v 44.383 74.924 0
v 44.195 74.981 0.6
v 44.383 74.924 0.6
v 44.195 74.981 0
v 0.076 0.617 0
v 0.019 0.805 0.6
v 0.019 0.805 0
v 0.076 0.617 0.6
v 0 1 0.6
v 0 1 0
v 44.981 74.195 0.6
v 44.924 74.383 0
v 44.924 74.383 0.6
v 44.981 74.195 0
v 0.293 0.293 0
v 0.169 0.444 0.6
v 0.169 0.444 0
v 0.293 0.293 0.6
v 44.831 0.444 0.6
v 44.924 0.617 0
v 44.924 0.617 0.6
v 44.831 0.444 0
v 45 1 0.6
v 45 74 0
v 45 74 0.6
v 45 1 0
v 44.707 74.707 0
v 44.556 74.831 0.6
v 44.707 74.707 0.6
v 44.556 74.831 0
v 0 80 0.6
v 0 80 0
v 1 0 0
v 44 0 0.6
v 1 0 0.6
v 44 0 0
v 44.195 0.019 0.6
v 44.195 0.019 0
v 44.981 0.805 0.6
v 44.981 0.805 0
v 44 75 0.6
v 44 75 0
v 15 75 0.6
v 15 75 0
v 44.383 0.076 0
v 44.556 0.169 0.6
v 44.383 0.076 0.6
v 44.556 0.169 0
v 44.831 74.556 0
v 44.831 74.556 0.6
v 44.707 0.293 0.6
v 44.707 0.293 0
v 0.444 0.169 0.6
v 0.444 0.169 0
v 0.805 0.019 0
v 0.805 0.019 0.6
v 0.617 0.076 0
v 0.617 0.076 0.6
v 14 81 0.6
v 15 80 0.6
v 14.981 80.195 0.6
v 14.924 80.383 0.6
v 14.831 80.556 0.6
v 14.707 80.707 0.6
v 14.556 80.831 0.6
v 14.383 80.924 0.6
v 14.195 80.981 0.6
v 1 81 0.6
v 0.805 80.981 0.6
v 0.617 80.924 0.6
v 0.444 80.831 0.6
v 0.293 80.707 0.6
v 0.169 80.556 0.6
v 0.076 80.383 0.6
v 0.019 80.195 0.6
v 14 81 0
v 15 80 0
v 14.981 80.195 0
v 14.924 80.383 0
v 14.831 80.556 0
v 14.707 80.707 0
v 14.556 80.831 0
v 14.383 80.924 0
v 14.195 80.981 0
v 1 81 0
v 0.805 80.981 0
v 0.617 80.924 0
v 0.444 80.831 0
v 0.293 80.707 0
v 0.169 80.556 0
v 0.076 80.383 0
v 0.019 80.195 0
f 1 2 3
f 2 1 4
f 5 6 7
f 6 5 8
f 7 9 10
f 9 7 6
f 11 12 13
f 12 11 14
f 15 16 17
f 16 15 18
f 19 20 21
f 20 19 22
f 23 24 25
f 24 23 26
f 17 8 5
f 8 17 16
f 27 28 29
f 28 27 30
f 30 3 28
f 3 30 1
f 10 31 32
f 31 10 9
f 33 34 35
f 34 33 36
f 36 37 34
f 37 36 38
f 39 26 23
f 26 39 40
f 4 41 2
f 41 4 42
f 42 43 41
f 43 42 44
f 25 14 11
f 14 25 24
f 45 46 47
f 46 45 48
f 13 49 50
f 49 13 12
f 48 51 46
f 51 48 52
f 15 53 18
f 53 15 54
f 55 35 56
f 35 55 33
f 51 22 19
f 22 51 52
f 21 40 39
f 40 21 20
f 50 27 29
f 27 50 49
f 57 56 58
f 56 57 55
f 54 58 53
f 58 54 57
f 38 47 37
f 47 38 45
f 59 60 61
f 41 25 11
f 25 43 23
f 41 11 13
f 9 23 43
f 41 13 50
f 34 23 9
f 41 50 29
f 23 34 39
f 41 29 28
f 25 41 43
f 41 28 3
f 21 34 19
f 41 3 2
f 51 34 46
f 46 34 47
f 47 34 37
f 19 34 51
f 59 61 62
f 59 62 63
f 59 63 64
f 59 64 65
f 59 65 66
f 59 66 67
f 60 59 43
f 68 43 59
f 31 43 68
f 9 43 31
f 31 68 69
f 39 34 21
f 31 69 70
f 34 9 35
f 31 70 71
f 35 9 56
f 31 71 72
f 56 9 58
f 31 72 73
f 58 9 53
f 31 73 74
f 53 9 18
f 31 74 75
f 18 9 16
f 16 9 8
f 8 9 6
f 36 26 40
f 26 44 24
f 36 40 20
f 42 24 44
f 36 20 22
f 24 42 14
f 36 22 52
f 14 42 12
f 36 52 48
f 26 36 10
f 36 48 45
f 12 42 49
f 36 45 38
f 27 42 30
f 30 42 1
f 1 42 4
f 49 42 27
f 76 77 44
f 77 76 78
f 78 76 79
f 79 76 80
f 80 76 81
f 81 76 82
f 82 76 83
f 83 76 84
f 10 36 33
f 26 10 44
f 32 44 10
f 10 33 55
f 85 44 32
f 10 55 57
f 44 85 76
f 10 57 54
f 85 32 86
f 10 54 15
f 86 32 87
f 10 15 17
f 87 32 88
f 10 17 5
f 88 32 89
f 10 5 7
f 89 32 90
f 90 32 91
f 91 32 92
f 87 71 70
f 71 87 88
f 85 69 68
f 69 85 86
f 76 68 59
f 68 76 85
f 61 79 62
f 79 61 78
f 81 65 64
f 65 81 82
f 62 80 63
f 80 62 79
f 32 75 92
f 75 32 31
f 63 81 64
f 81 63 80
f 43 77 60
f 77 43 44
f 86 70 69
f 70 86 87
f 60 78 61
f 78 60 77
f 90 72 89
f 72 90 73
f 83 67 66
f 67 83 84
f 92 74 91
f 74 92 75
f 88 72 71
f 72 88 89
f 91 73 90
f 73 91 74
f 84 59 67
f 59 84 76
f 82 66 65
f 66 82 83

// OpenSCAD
// Divider cards
// (c) Rainer Schlosshan

DivWidth=45;
DivHeight=75;
DivT=0.6;
CornerRadius=1;

TabHeight=6;
TabWidth=15;
TabPos=0;// [0:Left,1:Half Left,2:Middle,3:Half Right,4:Right]

// Rotate the text by this angle 
TextRotation=0; // positive values=clockwise, negative values=counter clockwise


/* [Text Line 1] */
// Put your text here
text="";
//Font to be used ( see https://fonts.google.com to choose from all of them )
font="exo"; //[<none>,abeezee,abel,abhayalibre,abrilfatface,abyssinicasil,acme,actor,adamina,adobeblank,adventpro,aguafinascript,akronim,aksarabaligalang,aladin,aldrich,alef,alefhebrew,alegreya,alegreyasans,alegreyasanssc,alegreyasc,aleo,alexbrush,alfaslabone,alice,alike,alikeangular,allan,allerta,allertastencil,allura,almendra,almendradisplay,almendrasc,amarante,amaranth,amaticasc,amaticsc,amethysta,amiko,amiri,amita,amstelvaralpha,anaheim,andada,andadasc,andika,angkor,annieuseyourtelescope,anonymouspro,antic,anticdidone,anticslab,anton,antonio,arapey,arbutus,arbutusslab,architectsdaughter,archivo,archivoblack,archivonarrow,archivovfbeta,arefruqaa,arimamadurai,arizonia,armata,arsenal,artifika,arvo,arya,asap,asapcondensed,asapvfbeta,asar,asset,assistant,astloch,asul,athiti,atma,atomicage,aubrey,audiowide,autourone,average,averagesans,averiagruesalibre,averialibre,averiasanslibre,averiaseriflibre,b612,b612mono,badscript,bahiana,baijamjuree,baloo,baloobhai,baloobhaijaan,baloobhaina,baloochettan,balooda,baloopaaji,balootamma,balootammudu,baloothambi,balthazar,bangers,barlow,barlowcondensed,barlowsemicondensed,barrio,basic,battambang,baumans,bayon,belgrano,bellefair,belleza,benchnine,bentham,berkshireswash,bevan,bhavuka,bigelowrules,bigshotone,bilbo,bilboswashcaps,biorhyme,biorhymeexpanded,biryani,bitter,blackandwhitepicture,blackhansans,blackopsone,bokor,bonbon,boogaloo,bowlbyone,bowlbyonesc,brawler,breeserif,brunoace,brunoacesc,bubblegumsans,bubblerone,buda,buenard,bungee,bungeehairline,bungeeinline,bungeeoutline,bungeeshade,butcherman,butchermancaps,butterflykids,cabin,cabincondensed,cabinsketch,cabinvfbeta,caesardressing,cagliostro,cairo,cambay,cambo,candal,cantarell,cantataone,cantoraone,capriola,cardo,carme,carroisgothic,carroisgothicsc,carterone,catamaran,caudex,caveat,caveatbrush,cedarvillecursive,cevicheone,chakrapetch,changa,changaone,chango,charm,charmonman,chathura,chauphilomeneone,chelaone,chelseamarket,chenla,cherryswash,chicle,chivo,chonburi,cinzel,cinzeldecorative,clickerscript,coda,codacaption,codystar,coiny,combo,comfortaa,concertone,condiment,conf.d,content,contrailone,convergence,cookie,copse,corben,cormorant,cormorantgaramond,cormorantinfant,cormorantsc,cormorantunicase,cormorantupright,courgette,coustard,coveredbyyourgrace,creepster,creteround,crimsontext,croissantone,cuprum,cutefont,cutive,cutivemono,damion,dancingscript,dangrek,dawningofanewday,daysone,decovaralpha,dekko,delius,deliusswashcaps,deliusunicase,dellarespira,denkone,devonshire,dhurjati,dhyana,didactgothic,digitalnumbers,diplomata,diplomatasc,dohyeon,dokdo,domine,donegalone,doppioone,dorsa,dosis,drsugiyama,durusans,dynalight,eaglelake,eastseadokdo,eater,eatercaps,ebgaramond,economica,eczar,ekmukta,electrolize,elmessiri,elsie,elsieswashcaps,emblemaone,emilyscandy,encodesans,encodesanscondensed,encodesansexpanded,encodesanssemicondensed,encodesanssemiexpanded,engagement,englebert,enriqueta,ericaone,esteban,euphoriascript,ewert,exo,exo2,expletussans,fahkwang,fanwoodtext,farsan,fascinate,fascinateinline,fasterone,fasthand,faunaone,faustina,faustinavfbeta,federant,federo,felipa,fenix,fingerpaint,firamono,firasans,firasanscondensed,firasansextracondensed,fjallaone,fjordone,flamenco,flavors,fondamento,fonts.conf,forum,francoisone,frankruhllibre,freckleface,frederickathegreat,fredokaone,freehand,fresca,frijole,fruktur,fugazone,gabriela,gaegu,gafata,galada,galdeano,galindo,gamjaflower,gemunulibre,gentiumbasic,gentiumbookbasic,geo,geostar,geostarfill,germaniaone,gfsdidot,gfsneohellenic,gidugu,gildadisplay,giveyouglory,glassantiqua,glegoo,gloriahallelujah,goblinone,gochihand,gorditas,gothica1,goudybookletter1911,graduate,grandhotel,gravitasone,greatvibes,griffy,gruppo,gudea,gugi,gurajada,habibi,halant,hammersmithone,hanalei,hanaleifill,handlee,hanna,hannari,hanuman,happymonkey,harmattan,headlandone,heebo,hennypenny,hermeneusone,herrvonmuellerhoff,himelody,hind,hindcolombo,hindguntur,hindjalandhar,hindkochi,hindmadurai,hindmysuru,hindsiliguri,hindvadodara,holtwoodonesc,homenaje,ibmplexmono,ibmplexsans,ibmplexsanscondensed,ibmplexserif,iceberg,iceland,imfelldoublepica,imfelldoublepicasc,imfelldwpica,imfelldwpicasc,imfellenglish,imfellenglishsc,imfellfrenchcanon,imfellfrenchcanonsc,imfellgreatprimer,imfellgreatprimersc,imprima,inconsolata,inder,indieflower,inika,inknutantiqua,istokweb,italiana,italianno,itim,jacquesfrancois,jacquesfrancoisshadow,jaldi,jejugothic,jejuhallasan,jejumyeongjo,jimnightshade,jockeyone,jollylodger,jomhuria,jomolhari,josefinsans,josefinsansstdlight,josefinslab,jotione,jua,judson,julee,juliussansone,junge,jura,justmeagaindownhere,k2d,kadwa,kalam,kameron,kanit,kantumruy,karla,karlatamilinclined,karlatamilupright,karma,katibeh,kaushanscript,kavivanar,kavoon,kdamthmor,keaniaone,kellyslab,kenia,khand,khmer,khula,khyay,kiranghaerang,kiteone,knewave,kodchasan,koho,kokoro,kopubbatang,kottaone,koulen,kreon,kristi,kronaone,krub,kumarone,kurale,labelleaurore,laila,lakkireddy,lalezar,lancelot,laomuangdon,laomuangkhong,laosanspro,lateef,lato,leaguescript,leckerlione,ledger,lekton,lemon,lemonada,lemonadavfbeta,Liberation-2.00.1,librebarcode128,librebarcode128text,librebarcode39,librebarcode39extended,librebarcode39extendedtext,librebarcode39text,librebaskerville,librecaslontext,librefranklin,lifesavers,lilitaone,lilyscriptone,limelight,lindenhill,lobster,lobstertwo,lohitbengali,lohitdevanagari,lohittamil,londrinaoutline,londrinashadow,londrinasketch,londrinasolid,lora,lovedbytheking,loversquarrel,loveyalikeasister,lusitana,lustria,macondo,macondoswashcaps,mada,magra,maitree,majormonodisplay,mako,mali,mallanna,mandali,manuale,marcellus,marcellussc,marckscript,margarine,markazitext,markazitextvfbeta,markoone,marmelad,martel,martelsans,marvel,mate,matesc,mavenpro,mavenprovfbeta,mclaren,meddon,medievalsharp,medulaone,meerainimai,megrim,meiescript,mergeone,merienda,meriendaone,merriweather,merriweathersans,mervalescript,metal,metalmania,metamorphous,metrophobic,miama,michroma,milonga,miltonian,miltoniantattoo,mina,miniver,miriamlibre,mirza,missfajardose,misssaintdelafield,mitr,modak,modernantiqua,mogra,molengo,molle,monda,monofett,monoton,monsieurladoulaise,montaga,montserrat,montserratalternates,montserratsubrayada,moul,moulpali,mousememoirs,mplus1p,mrbedford,mrbedfort,mrdafoe,mrdehaviland,mrssaintdelafield,mrssheppards,mukta,muktamahee,muktamalar,muktavaani,muli,myanmarsanspro,mysteryquest,nanumbrushscript,nanumgothic,nanumgothiccoding,nanummyeongjo,nanumpenscript,nats,neucha,neuton,newrocker,newscycle,nicomoji,niconne,nikukyu,niramit,nixieone,nobile,norican,nosifer,nosifercaps,notable,nothingyoucoulddo,noticiatext,notosans,notosanstamil,notoserif,novacut,novaflat,novamono,novaoval,novaround,novascript,novaslim,novasquare,ntr,numans,nunito,nunitosans,odormeanchey,offside,oflsortsmillgoudytt,oldenburg,oldstandardtt,oleoscript,oleoscriptswashcaps,oranienbaum,orbitron,oregano,orienta,originalsurfer,oswald,overlock,overlocksc,overpass,overpassmono,overtherainbow,ovo,oxygen,oxygenmono,pacifico,padauk,palanquin,palanquindark,pangolin,paprika,parisienne,passeroone,passionone,pathwaygothicone,patrickhand,patrickhandsc,pattaya,patuaone,pavanam,paytoneone,pecita,peddana,peralta,petitformalscript,petrona,phetsarath,philosopher,piedra,pinyonscript,pirataone,plaster,play,playball,playfairdisplay,playfairdisplaysc,podkova,podkovavfbeta,poetsenone,poiretone,pollerone,poly,pompiere,ponnala,pontanosans,poorstory,poppins,portersansblock,portlligatsans,portlligatslab,postnobillscolombo,postnobillsjaffna,pragatinarrow,prata,preahvihear,pressstart2p,pridi,princesssofia,prociono,prompt,prostoone,prozalibre,ptmono,ptsans,ptsanscaption,ptsansnarrow,ptserif,ptserifcaption,puritan,purplepurse,quando,quantico,quattrocento,quattrocentosans,questrial,quicksand,quintessential,qwigley,racingsansone,radley,rajdhani,rakkas,raleway,ralewaydots,ramabhadra,ramaraja,rambla,rammettoone,ranchers,ranga,rasa,rationale,raviprakash,redacted,redactedscript,reemkufi,reeniebeanie,revalia,rhodiumlibre,ribeye,ribeyemarrow,righteous,risque,rokkitt,rokkittvfbeta,romanesco,ropasans,rosario,rosarivo,rougescript,roundedmplus1c,rozhaone,rubik,rubikmonoone,rubikone,ruda,rufina,rugeboogie,ruluko,rumraisin,ruslandisplay,russoone,ruthie,rye,sacramento,sahitya,sail,saira,sairacondensed,sairaextracondensed,sairasemicondensed,salsa,sanchez,sancreek,sansation,sansita,sansitaone,sarabun,sarala,sarina,sarpanch,sawarabigothic,sawarabimincho,scada,scheherazade,scopeone,seaweedscript,secularone,sedan,sedansc,sedgwickave,sedgwickavedisplay,seoulhangang,seoulhangangcondensed,seoulnamsan,seoulnamsancondensed,seoulnamsanvertical,sevillana,seymourone,shadowsintolight,shadowsintolighttwo,shanti,share,sharetech,sharetechmono,shojumaru,shortstack,shrikhand,siamreap,siemreap,sigmarone,signika,signikanegative,simonetta,singleday,sintony,sirinstencil,sitara,sixcaps,skranji,slabo13px,slabo27px,smythe,sniglet,snippet,snowburstone,sofadione,sofia,songmyung,sonsieone,sortsmillgoudy,souliyo,sourcecodepro,sourcesanspro,sourceserifpro,spacemono,spectral,spectralsc,spicyrice,spinnaker,spirax,squadaone,sreekrushnadevaraya,sriracha,srisakdi,staatliches,stalemate,stalinistone,stalinone,stardosstencil,stintultracondensed,stintultraexpanded,stoke,strait,strong,stylish,sueellenfrancisco,suezone,sumana,sunflower,supermercadoone,sura,suranna,suravaram,suwannaphum,swankyandmoomoo,tajawal,tangerine,taprom,tauri,taviraj,teko,telex,tenaliramakrishna,tenorsans,terminaldosis,terminaldosislight,textmeone,thabit,tharlon,thasadith,thegirlnextdoor,tienne,tillana,timmana,titanone,titilliumweb,tradewinds,trirong,trocchi,trochut,trykker,tuffy,tulpenone,uncialantiqua,underdog,unicaone,unifrakturcook,unifrakturmaguntia,unlock,unna,vampiroone,varela,varelaround,varta,vastshadow,vesperlibre,vibur,vidaloka,viga,voces,volkhov,vollkorn,vollkornsc,voltaire,vt323,waitingforthesunrise,wallpoet,warnes,wellfleet,wendyone,wireone,worksans,yaldevicolombo,yanonekaffeesatz,yantramanav,yatraone,yeonsung,yesevaone,yesteryear,yinmar,yrsa,zcoolkuaile,zcoolqingkehuangyou,zcoolxiaowei,zeyada,zillaslab,zillaslabhighlight]
FontSize=4  ; //[2,3,4,5,6,7,8,9,10,12,15,17,20,25,30,40,50]
Bold=false;
Italic=false;

/* [Text Location & Orientation] */
//This parameter defines the thickness of the text. Negative values imprint text to the box, positive text will be added on top off the walls
FontThickness=-0.3; //[-5,-4,-3,-2,-1.5,-1.3,-1,-0.7,-0.5,-0.4,-0.3,-0.2,-0.1,0,0.1,0.2,0.3,0.4,0.5,0.7,1,1.3,1.5,2,3,4,5]

// Rotate the text by this angle 
//TextRotation=90; // positive values=clockwise, negative values=counter clockwise

// Allignment should only be changed wen Rotation=0
HorizontalAllignment="center"; //[left,center,right]
VerticalAllignment="center"; //[top,center,bottom]

// Add an additional horizontal offset (mm)
TextHorizontalOffset=0;
TextVerticalOffset=0;

//_____________________

// Quality Settings
$fa=360/60;//360/$fa = Max Facets Number
$fs=0.2; //prefered facet length 
FontStr=str(font,":style=",(Bold?"Bold ":" "),(Italic?"Italic":""));
 
// The X position of the tab
    TabX=(TabPos==0?0:
    TabPos==1?DivWidth/3-TabWidth/2:
    TabPos==2?DivWidth/2-TabWidth/2:
    TabPos==3?DivWidth/3*2-TabWidth/2:
    TabPos==4?DivWidth-TabWidth:0);
    
    echo("tabx=",TabX);
    
    TBBoxX=TabX;
     
     
difference() {
    union() {
        // The actual card
        roundedRect([DivWidth,DivHeight,DivT],CornerRadius);

        // the Divider
        translate([TabX,DivHeight-2*CornerRadius,0])
            roundedRect([TabWidth,TabHeight+2*CornerRadius,DivT],CornerRadius);
    
        if (FontThickness>0){
            // the Text
            translate([TBBoxX+TabWidth/2,DivHeight+TabHeight/2,DivT])  
            rotate([0,0-TextRotation,0]) 
                textWriter(
                            hAllign1=HorizontalAllignment,vAllign1=VerticalAllignment,hOffset1=TextHorizontalOffset,vOffset1=TextVerticalOffset
                            ,text1=text,font1=FontStr,fontSize1=FontSize
                            ,fontThickness=FontThickness
                            ,TBwidth=TabWidth,TBheight=TabHeight
                            ,debug=false);
        }
    } // (end of main union)
   //Negative text
    if (FontThickness<0){
            // the Text
            translate([TBBoxX+TabWidth/2,DivHeight+TabHeight/2,DivT])  
            rotate([0,0-TextRotation,0]) 
                textWriter(
                            hAllign1=HorizontalAllignment,vAllign1=VerticalAllignment,hOffset1=TextHorizontalOffset,vOffset1=TextVerticalOffset
                            ,text1=text,font1=FontStr,fontSize1=FontSize
                            ,fontThickness=FontThickness
                            ,TBwidth=TabWidth,TBheight=TabHeight
                            ,debug=false);
        }
}
    
    
//roundedRect (rounding only on sides, not bottom&top
//roundedRect([20,40,30],radius=2,center=true,$fn=75);
module roundedRect(size, radius)
{
    x = size[0];
    y = size[1];
    z = size[2];
    r=(radius==0?0.01:radius);
    linear_extrude(height=z)
    hull()
    {
        translate([r, r, 0])
        circle(r=r);
    
        translate([x-r,r, 0])
        circle(r=r);
        
        translate([x-r,y-r, 0])
        circle(r=r);
        
        translate([r,y-r, 0])
        circle(r=r);
    }
}

module textWriter(
    hAllign1="center",vAllign1="center"
    ,hOffset1=0,vOffset1=0,
    text1="text1",font1="",fontSize1=10
    ,hOffset2=0,vOffset2=0
    ,text2="",font2="",fontSize2=10
    ,fontThickness
     ,TBwidth=100,TBheight=50
    ,debug=false)
               
{
    //echo ("TextWriter hOffset1=",hOffset1,"vOffset1=",vOffset1);
    TBheight2=TBheight;
    TBwidth2=TBwidth;
    if(debug)translate([-TBwidth2/2,-TBheight2/2,0])cube([TBwidth2,TBheight2,1]);
    linespacing=1;
    height=fontSize1
        +(text2!=""?(fontSize2+linespacing):0);
    _yAllign=(vAllign1=="bottom"
                            ? - (TBheight2/2)+height/2
                            : (vAllign1=="top"
                                ?(TBheight2/2)-(height/2)
                                :0));
    _y1=_yAllign
            +(text2!=""
                ?height/2-fontSize1/2
                :0);
    //echo("_y1=",_y1);
    _y2=_yAllign
            +(text2!=""
                ?height/2-fontSize1-linespacing-fontSize2/2
                :0);
    posX=(hAllign1=="left"
                            ? -TBwidth2/2
                            : (hAllign1=="right"
                                ?TBwidth2/2
                                :0)   );
    translate([0,0,(fontThickness<0?fontThickness+0.01:0)])
    union(){
        translate([posX+hOffset1,_y1+vOffset1,0])
        linear_extrude(height=abs(fontThickness)) 
        text(text1,size=fontSize1, font=font1, spacing=1, halign = hAllign1,valign = "center"); 
        if(text2!=""){
            translate([posX+hOffset2,_y2+vOffset2,0])
            linear_extrude(height=abs(fontThickness)) 
            text(text2,size=fontSize2, font=font2, spacing=1, halign = hAllign1,valign = "center"); 
        }
    }
}
